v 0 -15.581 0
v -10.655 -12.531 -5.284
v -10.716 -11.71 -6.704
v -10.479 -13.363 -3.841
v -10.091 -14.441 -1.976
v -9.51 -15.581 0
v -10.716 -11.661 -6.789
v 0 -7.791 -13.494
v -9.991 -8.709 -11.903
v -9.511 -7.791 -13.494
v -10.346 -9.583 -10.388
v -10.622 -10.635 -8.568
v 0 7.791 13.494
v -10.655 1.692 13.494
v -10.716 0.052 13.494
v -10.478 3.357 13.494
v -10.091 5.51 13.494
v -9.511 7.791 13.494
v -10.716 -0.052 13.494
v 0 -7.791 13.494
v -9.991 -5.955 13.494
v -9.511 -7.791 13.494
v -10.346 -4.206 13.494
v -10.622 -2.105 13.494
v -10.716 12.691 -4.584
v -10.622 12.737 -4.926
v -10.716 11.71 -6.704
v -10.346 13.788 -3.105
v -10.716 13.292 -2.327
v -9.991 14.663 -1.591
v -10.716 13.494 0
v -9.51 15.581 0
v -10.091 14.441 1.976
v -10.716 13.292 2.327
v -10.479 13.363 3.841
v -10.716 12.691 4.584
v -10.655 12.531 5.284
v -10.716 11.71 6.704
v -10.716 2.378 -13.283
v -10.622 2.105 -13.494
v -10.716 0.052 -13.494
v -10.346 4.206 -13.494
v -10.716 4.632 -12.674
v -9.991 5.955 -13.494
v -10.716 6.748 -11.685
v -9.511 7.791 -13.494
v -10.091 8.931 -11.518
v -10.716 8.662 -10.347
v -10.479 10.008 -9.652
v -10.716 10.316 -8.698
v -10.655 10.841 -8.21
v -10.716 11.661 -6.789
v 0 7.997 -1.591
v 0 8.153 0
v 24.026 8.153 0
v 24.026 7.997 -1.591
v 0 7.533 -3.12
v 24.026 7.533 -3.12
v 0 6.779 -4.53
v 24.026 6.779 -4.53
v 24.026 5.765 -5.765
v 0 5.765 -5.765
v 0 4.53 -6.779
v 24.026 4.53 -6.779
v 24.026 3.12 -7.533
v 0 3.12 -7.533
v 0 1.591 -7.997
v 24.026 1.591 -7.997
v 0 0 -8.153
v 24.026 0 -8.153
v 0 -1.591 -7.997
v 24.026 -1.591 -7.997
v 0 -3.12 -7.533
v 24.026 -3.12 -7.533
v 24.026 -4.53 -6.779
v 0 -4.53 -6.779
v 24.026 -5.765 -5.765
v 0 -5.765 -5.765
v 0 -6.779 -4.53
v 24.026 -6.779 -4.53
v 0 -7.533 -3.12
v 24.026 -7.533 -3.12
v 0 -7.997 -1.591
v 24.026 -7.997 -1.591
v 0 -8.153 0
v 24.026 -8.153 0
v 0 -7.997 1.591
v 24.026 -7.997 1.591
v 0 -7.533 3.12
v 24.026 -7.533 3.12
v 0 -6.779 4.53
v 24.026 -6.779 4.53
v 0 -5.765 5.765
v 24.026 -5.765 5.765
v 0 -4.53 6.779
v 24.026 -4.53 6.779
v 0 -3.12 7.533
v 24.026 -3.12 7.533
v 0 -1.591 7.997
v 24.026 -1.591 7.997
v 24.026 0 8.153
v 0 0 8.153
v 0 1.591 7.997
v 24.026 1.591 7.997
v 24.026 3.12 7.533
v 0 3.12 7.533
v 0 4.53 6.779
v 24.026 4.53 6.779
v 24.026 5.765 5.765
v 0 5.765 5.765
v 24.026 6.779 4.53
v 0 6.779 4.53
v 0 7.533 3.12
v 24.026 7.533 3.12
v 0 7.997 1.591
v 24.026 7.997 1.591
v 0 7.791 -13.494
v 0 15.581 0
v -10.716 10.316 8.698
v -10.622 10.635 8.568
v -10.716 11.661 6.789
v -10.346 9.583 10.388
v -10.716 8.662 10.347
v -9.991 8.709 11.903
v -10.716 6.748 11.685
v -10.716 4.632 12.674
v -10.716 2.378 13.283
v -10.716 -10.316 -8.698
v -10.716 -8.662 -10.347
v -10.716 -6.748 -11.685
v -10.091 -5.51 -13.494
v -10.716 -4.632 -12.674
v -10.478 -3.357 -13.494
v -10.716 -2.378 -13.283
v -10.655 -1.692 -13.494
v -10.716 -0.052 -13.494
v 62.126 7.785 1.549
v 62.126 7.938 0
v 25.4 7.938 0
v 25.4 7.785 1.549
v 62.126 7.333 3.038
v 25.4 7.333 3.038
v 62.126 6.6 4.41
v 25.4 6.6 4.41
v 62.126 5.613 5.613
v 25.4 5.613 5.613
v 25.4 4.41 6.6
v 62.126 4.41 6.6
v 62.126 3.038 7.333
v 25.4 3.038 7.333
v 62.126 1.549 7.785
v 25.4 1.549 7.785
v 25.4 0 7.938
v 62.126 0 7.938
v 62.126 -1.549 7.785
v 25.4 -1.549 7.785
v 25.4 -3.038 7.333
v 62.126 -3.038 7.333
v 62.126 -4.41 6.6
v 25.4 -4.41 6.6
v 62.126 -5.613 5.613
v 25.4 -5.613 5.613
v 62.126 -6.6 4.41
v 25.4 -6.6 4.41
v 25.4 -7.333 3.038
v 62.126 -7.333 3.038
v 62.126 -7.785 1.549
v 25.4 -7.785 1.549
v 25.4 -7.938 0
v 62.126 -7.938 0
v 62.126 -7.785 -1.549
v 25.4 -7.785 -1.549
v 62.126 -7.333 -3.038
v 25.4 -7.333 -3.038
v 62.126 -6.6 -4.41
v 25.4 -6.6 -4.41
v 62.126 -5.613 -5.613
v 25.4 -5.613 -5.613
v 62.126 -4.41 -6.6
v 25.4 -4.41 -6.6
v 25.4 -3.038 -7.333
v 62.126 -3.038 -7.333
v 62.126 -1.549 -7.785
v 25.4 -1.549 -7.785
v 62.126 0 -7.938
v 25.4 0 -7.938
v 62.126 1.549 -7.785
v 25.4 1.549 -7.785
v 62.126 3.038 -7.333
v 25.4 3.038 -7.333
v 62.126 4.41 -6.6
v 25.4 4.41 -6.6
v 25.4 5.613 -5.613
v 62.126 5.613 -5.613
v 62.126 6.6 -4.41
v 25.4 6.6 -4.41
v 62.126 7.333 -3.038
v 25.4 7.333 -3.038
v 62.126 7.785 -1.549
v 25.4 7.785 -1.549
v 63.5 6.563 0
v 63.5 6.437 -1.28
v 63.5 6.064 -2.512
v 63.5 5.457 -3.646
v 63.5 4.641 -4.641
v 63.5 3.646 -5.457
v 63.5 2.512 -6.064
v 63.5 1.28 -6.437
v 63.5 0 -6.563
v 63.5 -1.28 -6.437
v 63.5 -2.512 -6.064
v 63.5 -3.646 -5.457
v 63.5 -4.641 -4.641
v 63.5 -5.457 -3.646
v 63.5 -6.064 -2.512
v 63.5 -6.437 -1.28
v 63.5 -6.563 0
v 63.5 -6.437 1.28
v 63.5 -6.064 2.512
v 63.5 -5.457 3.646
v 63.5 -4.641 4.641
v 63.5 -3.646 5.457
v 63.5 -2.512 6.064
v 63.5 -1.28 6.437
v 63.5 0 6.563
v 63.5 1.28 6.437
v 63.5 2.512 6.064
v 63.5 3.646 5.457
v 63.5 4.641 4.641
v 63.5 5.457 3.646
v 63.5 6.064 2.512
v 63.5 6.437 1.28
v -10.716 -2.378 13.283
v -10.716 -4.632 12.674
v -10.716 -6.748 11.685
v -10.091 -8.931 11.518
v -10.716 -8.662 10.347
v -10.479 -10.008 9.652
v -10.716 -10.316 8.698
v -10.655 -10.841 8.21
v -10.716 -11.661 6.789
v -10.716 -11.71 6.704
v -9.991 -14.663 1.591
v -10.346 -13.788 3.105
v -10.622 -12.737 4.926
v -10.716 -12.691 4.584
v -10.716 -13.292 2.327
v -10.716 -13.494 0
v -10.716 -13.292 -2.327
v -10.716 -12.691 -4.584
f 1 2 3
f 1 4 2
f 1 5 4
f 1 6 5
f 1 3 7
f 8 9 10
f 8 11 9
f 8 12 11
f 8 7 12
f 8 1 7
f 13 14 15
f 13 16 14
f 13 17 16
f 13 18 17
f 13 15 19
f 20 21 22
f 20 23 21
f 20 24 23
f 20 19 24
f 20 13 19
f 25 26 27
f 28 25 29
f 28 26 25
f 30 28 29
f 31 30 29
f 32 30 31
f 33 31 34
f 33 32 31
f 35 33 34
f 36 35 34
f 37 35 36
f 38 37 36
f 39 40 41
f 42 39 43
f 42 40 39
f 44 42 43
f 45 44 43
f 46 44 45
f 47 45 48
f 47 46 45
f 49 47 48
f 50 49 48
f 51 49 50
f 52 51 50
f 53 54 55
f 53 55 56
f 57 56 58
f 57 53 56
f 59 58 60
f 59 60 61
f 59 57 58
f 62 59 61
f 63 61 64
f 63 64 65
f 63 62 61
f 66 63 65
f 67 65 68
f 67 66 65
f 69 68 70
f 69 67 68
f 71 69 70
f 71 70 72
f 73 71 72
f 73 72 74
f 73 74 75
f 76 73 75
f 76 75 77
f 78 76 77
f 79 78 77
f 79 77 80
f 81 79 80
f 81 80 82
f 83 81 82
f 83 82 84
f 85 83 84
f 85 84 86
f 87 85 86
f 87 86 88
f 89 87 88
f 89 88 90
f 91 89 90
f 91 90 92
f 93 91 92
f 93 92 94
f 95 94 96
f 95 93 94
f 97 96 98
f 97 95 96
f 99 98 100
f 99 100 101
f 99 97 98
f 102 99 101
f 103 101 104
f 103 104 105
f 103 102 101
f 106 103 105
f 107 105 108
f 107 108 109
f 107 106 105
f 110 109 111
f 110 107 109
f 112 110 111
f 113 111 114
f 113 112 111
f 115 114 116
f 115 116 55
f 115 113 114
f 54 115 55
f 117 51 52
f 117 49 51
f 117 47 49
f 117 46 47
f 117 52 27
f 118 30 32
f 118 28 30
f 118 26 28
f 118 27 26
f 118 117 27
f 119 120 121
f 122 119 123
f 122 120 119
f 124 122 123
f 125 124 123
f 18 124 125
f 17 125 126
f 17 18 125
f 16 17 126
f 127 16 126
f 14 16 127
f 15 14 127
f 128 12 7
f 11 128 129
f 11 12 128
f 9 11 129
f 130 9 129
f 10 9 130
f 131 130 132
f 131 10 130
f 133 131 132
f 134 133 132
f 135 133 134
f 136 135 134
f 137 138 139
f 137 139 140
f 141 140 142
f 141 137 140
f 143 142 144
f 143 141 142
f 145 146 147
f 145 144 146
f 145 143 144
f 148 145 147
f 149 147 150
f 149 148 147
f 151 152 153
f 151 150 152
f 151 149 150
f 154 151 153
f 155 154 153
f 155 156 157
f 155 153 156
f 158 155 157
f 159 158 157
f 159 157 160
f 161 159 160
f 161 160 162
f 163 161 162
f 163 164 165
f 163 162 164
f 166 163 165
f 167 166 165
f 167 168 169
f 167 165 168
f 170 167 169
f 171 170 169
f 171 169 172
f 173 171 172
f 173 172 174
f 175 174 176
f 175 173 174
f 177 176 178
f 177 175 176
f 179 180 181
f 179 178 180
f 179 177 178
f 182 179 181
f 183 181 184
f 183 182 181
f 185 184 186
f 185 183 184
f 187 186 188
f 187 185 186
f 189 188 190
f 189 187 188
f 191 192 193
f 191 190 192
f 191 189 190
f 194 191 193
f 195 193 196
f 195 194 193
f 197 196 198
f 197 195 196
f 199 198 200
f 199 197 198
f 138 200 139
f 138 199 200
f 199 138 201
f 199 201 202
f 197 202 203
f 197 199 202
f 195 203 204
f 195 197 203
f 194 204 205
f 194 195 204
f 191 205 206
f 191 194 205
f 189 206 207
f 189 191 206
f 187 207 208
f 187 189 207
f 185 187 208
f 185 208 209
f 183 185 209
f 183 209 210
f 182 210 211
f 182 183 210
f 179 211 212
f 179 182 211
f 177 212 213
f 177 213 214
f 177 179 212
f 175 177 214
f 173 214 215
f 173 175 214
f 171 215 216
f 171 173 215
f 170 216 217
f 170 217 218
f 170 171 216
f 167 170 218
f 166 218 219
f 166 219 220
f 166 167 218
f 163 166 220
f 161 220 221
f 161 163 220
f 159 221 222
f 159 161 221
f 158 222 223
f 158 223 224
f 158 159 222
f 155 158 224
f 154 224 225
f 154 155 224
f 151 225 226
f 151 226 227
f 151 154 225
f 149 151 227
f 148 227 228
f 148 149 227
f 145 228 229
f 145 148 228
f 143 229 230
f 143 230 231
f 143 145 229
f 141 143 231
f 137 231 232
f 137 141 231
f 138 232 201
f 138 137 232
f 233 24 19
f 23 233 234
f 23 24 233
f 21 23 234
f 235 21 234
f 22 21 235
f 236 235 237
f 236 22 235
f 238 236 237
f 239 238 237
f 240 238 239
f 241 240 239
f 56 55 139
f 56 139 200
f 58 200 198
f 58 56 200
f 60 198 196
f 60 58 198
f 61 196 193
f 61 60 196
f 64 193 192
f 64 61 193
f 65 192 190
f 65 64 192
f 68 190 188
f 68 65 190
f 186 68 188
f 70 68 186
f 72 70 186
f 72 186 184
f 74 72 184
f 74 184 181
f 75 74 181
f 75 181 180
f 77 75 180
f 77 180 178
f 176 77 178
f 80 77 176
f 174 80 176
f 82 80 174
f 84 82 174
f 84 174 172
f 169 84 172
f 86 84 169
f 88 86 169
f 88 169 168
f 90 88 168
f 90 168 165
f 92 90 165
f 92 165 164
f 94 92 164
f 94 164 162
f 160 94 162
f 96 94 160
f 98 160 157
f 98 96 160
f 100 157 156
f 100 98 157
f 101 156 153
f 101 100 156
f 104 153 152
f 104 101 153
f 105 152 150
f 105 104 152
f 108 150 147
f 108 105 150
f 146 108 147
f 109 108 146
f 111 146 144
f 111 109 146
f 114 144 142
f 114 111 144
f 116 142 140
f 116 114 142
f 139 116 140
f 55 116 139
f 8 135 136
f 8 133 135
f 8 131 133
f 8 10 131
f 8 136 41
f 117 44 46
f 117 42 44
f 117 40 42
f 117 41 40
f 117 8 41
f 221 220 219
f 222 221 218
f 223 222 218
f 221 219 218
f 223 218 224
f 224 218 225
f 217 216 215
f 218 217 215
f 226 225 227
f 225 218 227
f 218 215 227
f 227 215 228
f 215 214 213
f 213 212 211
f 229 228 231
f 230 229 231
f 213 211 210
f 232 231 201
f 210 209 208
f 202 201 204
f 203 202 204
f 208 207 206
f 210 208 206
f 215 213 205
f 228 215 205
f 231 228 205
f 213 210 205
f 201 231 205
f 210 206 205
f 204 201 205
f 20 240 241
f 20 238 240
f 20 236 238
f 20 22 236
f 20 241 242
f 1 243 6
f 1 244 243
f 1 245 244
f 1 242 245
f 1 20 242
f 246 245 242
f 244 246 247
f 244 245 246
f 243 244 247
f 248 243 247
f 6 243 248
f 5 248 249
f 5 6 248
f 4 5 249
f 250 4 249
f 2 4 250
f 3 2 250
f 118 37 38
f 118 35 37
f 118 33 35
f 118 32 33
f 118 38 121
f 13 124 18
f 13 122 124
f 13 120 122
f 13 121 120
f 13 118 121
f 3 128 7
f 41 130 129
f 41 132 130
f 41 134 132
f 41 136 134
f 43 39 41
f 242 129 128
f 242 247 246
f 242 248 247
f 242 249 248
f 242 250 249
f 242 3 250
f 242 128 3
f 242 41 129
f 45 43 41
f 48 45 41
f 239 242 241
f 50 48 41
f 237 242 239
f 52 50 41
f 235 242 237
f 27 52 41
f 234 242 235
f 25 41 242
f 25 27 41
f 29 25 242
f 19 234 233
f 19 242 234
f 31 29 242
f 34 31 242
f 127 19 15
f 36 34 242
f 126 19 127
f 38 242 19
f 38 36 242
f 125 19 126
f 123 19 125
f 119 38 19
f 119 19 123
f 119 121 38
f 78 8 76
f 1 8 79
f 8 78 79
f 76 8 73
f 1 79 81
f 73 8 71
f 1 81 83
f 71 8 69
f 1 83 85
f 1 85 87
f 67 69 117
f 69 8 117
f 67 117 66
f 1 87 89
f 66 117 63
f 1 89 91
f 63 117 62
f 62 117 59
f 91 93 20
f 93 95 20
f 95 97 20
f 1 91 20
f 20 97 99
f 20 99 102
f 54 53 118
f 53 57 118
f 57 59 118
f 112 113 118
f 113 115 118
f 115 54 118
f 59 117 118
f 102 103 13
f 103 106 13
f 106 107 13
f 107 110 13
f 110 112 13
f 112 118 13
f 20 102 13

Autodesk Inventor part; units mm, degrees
ref_plane "YZ Plane" through (0, 0, 0) normal (1, 0, 0) x (0, 1, 0)
ref_plane "XZ Plane" through (0, 0, 0) normal (0, 1, 0) x (-1, 0, 0)
ref_plane "XY Plane" through (0, 0, 0) normal (0, 0, 1) x (1, 0, 0)
sketch "Sketch1" plane through (0, 0, 0) normal (0, 0, 1) x (1, 0, 0)
  line L0 (0, 8.1534) -> (0, 8.1534)
  line L1 (25.4, 7.9375) -> (63.5, 7.9375)
  line L2 (63.5, 7.9375) -> (63.5, 0)
  line L3 (63.5, 0) -> (-0.0001, 0)
  line L4 (-6.3501, 0) -> (82.55, 0) projected
  line L5 (-0.0001, 0) -> (-0.0001, 8.1534)
  line L6 (-0.0001, 8.1534) -> (0, 8.1534)
  line L7 (25.4, 7.9375) -> (24.0258, 8.1534)
  line L8 (24.0258, 8.1534) -> (0, 8.1534)
  line L9 (0, -0.8153) -> (0, 10.5994) projected
  dimension "d0" = 63.5
  dimension "d1" = 38.1
  dimension "d2" = 15.875
  dimension "d9" = 0.0001
  dimension "d10" = 16.3068
  dimension "d13" = 1.3742
  dimension "d14" = 16.3068
revolve "Body" add sketch "Sketch1" angle 360 about axis through (63.5, 0, 0) along (-1, 0, 0)
sketch "Sketch2" plane through (-0.0001, 0, 0) normal (-1, 0, 0) x (0, 0, 1)
  line L0 (0, 15.5812) -> (13.4937, 7.7906)
  line L1 (13.4937, 7.7906) -> (13.4937, -7.7906)
  line L2 (13.4937, -7.7906) -> (0, -15.5812)
  line L3 (0, -15.5812) -> (-13.4937, -7.7906)
  line L4 (-13.4937, -7.7906) -> (-13.4937, 7.7906)
  line L5 (-13.4937, 7.7906) -> (0, 15.5812)
  point P0 (0, 0)
  point P1 (0, 0)
  dimension "d11" = 26.9875
extrude "Head" add sketch "Sketch2" along normal blind 10.7156
sketch "Sketch4" plane through (0, 0, 0) normal (0, 0, 1) x (1, 0, 0)
  line L0 (-10.7157, 13.4938) -> (-10.7157, 15.5812)
  line L1 (-10.7157, 15.5812) -> (-9.5105, 15.5812)
  line L2 (-9.5105, 15.5812) -> (-10.7157, 13.4938)
  line L3 (-11.7873, 0) -> (3.2146, 0) projected
  line L4 (-0.0001, 15.5812) -> (-10.7157, 15.5812) projected
  line L5 (-10.7157, 7.7906) -> (-10.7157, 15.5812) projected
  dimension "d5" = 30
  dimension "d19" = 26.9875
revolve "Chamfer1" cut sketch "Sketch4" angle 360 about axis through (-10, 0, 0) along (1, 0, 0)
thread "Thread" size "5/8-11 UNC" class "2A" standard "ANSI Unified Screw Threads" length 38.1
chamfer "Chamfer2" distance 1.3741 distance2 1.3742 1 edges at (63.5, -7.9375, 0) measured on face at (63.5, -0.6813, 3.1515)
equation "\"d0\" = NLG"
equation "\"d1\" = GEL"
equation "\"d2\" = GD"
equation "\"d10\" = SD2"
equation "\"d14\" = BDM"
equation "\"d11\" = SW"
equation "\"d3\" = KOH - SD"
equation "\"d5\" = ANG1"
equation "\"d19\" = SW0"
equation "\"d15\" = GEL"
equation "\"d6\" = -0.5 * SPD + 0.5 * GD"
equation "\"NLG\" = 63.5"
equation "\"GD\" = NND"
equation "\"BDM\" = 16.3068"
equation "\"KOH\" = 10.71562"
equation "\"GEL\" = 38.1"
equation "\"SW\" = 26.9875"
equation "\"SW0\" = SW"
equation "\"SPD\" = 13.12672"
equation "\"SD2\" = BDM"
equation "\"SD\" = 0"
equation "\"ANG1\" = 30deg"
equation "\"GAL\" = GUL"
equation "\"GUL\" = 1.37414"
equation "\"RR\" = 1.524"
equation "\"d20\" = -NLG"
equation "\"TOA\" = 30deg"
equation "\"THREADDIA\" = 15.875"
equation "\"E0\" = 1.155 * SW"
equation "\"GD1\" = SPD"
equation "\"SLG\" = 19.62734"
equation "\"NND\" = 15.875"
properties part number "ANSI B18.2.1 - 5/8-11 UNC - 2.5"
